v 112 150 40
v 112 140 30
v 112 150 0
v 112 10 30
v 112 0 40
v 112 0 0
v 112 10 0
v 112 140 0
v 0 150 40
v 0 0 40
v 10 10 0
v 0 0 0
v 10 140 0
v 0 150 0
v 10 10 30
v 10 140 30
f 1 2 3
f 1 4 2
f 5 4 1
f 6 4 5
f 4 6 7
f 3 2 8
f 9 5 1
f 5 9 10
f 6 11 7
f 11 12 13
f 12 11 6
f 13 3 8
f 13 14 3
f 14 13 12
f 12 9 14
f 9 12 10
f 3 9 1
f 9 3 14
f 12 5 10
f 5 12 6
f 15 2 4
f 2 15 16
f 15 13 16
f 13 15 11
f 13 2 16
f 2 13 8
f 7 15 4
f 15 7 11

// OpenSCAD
/**
* Design:
*    Monitor lifts
*    
* Use:
*    Set monitor ontop to raise thei eye level
**/

/**
* Units in mm
* Edit these values to create the perfect lift for
* any monitor!
**/
width = 110 + 2;
length = 150;
height = 40;
edges = false;
wall=10;

difference(){
    cube([width,length,height],center=false);
    translate([wall, wall, -wall]){
        cube([width,length-2*wall,height],center=false);
    }
}

if (edges){
    difference(){
        translate([0,0,height-1]){
            cube([width,length,6],center=false);
        }
        translate([2,2,height+1]){
            cube([width-4,length,5],center=false);
        }
    }
}
